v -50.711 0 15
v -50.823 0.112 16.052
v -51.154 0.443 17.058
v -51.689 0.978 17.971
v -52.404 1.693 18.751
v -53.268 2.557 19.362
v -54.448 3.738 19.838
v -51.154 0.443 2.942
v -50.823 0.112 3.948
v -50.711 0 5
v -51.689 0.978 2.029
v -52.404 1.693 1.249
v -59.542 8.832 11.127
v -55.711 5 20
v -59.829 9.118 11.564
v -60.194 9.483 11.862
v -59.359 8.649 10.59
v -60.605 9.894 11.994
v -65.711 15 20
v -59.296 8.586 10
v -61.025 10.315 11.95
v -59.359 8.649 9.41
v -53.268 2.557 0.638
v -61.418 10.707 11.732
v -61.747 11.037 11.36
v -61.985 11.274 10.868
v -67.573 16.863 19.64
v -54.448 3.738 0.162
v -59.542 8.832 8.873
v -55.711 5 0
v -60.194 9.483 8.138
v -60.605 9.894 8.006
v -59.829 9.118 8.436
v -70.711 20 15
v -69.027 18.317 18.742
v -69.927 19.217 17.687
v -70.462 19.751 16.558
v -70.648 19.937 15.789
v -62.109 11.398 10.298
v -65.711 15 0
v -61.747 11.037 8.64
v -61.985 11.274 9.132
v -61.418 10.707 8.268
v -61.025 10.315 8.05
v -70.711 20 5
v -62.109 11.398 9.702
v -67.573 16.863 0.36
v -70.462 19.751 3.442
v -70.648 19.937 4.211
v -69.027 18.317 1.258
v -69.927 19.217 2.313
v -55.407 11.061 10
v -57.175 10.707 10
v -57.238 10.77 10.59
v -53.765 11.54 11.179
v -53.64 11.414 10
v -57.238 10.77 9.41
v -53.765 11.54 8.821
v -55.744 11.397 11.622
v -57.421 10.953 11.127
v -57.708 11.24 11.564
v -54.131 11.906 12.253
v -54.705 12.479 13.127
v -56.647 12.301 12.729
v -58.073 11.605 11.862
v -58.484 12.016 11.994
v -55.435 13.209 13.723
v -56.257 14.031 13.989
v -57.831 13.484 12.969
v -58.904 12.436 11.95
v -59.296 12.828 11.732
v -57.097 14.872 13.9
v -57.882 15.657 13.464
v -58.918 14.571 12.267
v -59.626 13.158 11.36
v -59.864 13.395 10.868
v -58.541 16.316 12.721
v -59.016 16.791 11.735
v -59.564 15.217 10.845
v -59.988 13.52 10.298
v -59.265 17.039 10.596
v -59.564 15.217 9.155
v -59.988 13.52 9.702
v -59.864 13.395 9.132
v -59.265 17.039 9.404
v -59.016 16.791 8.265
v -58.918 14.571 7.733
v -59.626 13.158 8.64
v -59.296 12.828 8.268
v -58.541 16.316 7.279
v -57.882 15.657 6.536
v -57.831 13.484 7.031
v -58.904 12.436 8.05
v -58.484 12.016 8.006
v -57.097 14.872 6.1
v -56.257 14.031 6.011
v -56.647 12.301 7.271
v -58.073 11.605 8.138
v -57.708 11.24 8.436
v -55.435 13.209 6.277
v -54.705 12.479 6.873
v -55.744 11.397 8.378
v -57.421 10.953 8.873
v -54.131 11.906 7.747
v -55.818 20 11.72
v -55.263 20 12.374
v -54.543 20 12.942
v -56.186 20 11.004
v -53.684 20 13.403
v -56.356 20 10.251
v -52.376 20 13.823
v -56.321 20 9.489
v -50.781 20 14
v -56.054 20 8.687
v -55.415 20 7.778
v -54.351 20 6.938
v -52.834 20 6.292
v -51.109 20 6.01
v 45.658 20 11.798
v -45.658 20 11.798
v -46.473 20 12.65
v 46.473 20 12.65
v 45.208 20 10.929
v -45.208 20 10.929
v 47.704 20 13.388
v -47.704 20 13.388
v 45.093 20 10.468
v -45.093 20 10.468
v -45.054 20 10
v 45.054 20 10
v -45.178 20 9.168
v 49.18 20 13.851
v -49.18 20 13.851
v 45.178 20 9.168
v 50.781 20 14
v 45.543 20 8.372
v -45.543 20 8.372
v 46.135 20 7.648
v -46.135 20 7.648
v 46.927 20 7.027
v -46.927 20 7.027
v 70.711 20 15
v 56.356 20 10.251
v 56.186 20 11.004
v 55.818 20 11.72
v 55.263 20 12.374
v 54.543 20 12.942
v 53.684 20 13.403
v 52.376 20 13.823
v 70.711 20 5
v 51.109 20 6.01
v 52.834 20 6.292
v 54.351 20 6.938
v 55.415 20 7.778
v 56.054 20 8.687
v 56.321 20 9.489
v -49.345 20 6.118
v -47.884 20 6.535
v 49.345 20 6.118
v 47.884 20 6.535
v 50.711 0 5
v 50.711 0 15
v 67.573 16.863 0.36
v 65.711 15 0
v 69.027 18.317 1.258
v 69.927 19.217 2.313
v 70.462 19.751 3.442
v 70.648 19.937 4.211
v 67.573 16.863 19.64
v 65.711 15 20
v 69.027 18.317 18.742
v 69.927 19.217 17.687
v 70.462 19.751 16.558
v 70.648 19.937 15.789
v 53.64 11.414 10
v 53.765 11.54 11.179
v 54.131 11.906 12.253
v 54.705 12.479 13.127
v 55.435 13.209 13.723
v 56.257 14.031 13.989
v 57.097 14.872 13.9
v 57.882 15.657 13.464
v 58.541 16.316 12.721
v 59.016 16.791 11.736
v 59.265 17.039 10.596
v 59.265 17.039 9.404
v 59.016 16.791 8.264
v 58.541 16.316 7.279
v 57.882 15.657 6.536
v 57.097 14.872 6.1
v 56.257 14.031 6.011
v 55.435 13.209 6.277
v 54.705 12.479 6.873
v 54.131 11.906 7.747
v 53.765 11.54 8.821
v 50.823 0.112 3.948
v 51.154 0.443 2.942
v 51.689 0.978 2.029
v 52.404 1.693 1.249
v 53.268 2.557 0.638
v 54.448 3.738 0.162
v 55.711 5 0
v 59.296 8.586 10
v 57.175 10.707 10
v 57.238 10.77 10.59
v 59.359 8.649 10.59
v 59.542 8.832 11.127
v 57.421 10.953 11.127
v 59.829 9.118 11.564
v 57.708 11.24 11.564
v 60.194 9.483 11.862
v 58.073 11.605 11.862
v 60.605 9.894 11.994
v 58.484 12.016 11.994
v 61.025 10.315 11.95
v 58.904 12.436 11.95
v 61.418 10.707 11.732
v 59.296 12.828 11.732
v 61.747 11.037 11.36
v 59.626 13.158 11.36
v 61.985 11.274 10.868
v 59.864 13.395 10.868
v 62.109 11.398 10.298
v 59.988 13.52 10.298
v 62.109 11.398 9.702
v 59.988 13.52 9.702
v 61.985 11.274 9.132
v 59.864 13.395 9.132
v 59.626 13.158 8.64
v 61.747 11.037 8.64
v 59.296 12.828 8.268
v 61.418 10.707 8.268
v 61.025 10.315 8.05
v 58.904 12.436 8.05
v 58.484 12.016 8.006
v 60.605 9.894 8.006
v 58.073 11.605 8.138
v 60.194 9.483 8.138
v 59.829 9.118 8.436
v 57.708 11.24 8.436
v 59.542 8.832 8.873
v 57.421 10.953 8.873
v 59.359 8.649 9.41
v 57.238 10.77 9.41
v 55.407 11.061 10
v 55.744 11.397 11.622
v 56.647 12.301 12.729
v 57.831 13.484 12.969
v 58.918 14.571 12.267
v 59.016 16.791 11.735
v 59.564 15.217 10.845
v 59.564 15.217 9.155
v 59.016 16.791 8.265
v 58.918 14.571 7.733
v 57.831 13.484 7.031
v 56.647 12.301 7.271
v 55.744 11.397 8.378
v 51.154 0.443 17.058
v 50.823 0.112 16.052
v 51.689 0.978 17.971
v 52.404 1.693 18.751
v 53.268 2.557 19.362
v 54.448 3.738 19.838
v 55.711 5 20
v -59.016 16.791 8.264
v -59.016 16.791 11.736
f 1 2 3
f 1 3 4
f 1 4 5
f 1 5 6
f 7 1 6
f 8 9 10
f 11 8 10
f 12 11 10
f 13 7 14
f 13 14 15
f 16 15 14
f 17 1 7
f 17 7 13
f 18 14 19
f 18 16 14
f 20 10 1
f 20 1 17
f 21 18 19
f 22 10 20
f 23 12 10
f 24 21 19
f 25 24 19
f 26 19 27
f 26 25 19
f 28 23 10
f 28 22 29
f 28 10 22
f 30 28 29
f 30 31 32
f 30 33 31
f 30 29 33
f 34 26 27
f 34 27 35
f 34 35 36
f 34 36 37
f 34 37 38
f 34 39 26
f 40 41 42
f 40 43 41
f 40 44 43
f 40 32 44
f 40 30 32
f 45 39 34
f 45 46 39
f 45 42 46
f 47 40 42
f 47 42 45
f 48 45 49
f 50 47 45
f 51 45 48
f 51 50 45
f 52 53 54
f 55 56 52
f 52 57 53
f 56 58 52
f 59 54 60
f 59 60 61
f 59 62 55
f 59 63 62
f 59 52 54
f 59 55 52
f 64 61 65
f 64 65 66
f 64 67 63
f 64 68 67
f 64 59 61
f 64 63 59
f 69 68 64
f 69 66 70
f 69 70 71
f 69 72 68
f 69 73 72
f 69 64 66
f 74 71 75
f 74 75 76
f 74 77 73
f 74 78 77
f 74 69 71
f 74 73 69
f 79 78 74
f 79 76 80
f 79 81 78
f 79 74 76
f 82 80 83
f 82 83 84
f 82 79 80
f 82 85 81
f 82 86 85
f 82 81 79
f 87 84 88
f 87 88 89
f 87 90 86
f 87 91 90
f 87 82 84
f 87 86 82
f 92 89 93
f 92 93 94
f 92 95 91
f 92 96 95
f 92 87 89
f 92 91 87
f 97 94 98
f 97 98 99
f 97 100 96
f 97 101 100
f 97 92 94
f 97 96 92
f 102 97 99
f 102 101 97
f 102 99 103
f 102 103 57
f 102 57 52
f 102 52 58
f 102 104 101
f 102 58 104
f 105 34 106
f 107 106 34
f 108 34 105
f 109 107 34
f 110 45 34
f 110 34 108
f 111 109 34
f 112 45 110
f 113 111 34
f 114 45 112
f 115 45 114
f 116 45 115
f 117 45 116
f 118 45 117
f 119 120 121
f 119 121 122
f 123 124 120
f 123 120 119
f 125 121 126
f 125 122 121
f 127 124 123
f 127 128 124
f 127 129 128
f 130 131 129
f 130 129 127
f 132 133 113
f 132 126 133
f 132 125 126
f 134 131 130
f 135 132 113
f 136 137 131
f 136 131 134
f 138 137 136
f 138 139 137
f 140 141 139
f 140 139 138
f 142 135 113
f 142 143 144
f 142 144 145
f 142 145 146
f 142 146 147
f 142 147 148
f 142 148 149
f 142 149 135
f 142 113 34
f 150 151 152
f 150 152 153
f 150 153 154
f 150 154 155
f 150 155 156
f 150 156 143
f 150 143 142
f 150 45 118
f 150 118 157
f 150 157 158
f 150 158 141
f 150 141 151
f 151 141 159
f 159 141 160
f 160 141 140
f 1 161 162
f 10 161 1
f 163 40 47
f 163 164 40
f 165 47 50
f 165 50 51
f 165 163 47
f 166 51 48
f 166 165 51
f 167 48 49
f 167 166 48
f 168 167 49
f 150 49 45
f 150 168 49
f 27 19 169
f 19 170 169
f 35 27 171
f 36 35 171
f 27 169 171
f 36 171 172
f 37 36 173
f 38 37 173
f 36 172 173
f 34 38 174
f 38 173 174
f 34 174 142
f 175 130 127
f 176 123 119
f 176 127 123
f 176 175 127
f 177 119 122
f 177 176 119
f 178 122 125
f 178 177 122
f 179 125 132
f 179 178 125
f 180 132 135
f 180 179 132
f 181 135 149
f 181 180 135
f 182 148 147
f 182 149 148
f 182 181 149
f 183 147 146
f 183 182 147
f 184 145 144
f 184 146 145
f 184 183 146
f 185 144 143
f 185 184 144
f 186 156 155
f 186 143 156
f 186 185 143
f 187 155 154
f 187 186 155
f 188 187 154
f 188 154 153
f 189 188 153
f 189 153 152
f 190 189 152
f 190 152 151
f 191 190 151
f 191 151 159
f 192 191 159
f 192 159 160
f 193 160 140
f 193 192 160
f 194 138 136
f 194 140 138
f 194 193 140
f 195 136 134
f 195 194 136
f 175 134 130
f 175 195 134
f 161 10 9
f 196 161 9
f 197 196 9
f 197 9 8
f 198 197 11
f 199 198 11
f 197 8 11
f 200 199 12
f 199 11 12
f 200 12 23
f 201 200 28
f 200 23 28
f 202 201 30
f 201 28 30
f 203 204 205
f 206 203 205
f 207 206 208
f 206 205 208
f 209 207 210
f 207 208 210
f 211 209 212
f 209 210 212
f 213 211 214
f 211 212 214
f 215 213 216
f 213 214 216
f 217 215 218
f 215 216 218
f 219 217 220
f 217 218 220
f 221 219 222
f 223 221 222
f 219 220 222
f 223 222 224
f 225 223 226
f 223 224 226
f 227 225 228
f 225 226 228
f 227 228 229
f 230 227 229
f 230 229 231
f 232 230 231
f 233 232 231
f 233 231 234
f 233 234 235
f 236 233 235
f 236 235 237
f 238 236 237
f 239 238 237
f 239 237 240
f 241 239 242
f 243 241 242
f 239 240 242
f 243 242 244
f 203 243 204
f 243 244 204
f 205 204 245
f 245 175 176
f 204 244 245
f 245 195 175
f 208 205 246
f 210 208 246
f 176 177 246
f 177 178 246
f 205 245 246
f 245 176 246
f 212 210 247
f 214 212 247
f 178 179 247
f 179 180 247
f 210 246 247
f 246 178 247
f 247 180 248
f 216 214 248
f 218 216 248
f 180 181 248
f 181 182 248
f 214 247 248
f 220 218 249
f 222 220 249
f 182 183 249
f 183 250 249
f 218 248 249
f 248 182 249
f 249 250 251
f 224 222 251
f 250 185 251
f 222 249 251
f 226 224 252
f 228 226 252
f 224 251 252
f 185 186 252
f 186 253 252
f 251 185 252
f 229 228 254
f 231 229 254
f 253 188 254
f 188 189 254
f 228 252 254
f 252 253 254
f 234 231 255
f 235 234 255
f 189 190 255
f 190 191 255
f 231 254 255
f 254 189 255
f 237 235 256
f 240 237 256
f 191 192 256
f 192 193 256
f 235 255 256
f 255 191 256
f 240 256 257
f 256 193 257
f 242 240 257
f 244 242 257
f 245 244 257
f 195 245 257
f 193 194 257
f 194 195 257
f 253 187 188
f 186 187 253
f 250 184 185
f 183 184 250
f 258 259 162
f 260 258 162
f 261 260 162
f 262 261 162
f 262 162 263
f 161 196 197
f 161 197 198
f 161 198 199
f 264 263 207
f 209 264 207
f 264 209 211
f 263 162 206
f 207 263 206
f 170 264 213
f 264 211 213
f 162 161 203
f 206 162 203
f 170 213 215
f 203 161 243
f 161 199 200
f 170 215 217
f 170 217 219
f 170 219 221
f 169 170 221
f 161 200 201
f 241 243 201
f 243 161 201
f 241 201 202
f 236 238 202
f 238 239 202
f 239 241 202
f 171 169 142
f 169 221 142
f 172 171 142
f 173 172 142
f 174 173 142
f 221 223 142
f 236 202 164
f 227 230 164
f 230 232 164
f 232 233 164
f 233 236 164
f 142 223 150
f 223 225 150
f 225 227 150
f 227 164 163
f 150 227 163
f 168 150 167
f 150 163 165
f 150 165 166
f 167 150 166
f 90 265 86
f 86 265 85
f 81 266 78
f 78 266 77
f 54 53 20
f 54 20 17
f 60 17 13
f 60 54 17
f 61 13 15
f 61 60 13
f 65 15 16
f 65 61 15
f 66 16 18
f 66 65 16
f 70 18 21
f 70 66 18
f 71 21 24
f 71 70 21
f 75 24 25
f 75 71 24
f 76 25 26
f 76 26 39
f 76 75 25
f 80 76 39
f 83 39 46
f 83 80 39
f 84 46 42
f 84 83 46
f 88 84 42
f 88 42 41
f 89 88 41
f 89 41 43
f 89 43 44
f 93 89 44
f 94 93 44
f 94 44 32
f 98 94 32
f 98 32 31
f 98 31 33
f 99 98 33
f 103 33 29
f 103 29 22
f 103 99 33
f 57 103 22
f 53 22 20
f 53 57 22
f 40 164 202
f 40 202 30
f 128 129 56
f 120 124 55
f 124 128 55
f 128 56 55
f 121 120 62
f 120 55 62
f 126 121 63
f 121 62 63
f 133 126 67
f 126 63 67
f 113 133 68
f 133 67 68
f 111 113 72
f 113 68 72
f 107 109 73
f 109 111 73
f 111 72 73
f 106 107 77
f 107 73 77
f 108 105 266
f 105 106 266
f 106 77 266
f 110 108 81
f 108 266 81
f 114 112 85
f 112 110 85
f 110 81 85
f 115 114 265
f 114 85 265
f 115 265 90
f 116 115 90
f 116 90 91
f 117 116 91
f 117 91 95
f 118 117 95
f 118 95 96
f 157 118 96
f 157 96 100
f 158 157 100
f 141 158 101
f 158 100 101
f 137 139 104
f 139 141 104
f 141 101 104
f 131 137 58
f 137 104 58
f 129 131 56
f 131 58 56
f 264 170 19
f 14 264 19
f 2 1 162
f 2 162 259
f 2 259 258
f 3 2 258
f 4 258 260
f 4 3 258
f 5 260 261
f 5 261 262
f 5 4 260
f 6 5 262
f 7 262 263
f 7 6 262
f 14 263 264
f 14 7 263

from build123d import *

# Parameters (mm, degrees)
PAD_DEPTH         = 20
SKETCH002_R       = 2
POCKET_DEPTH      = 20.143136
POCKET_DEPTH_BACK = 44.001
SKETCH003_R       = 4
POCKET001_DEPTH   = 44.001
CHAMFER_SIZE2     = 1.9999
CHAMFER_SIZE      = 3
FILLET_R          = 5


with BuildPart() as part:
    # Sketch → Pad (new body)
    with BuildSketch(Plane.XY):
        Polygon((0, 0), (50.710678, 0), (70.710678, 20), (0, 20), align=None)
    extrude(amount=PAD_DEPTH)

    # Sketch002 (on DatumPlane) → Pocket (cut, two sides)
    with BuildSketch(Plane(origin=(21.112698, -21.112698, 0), x_dir=(-0.707107, -0.707107, 0), z_dir=(-0.707107, 0.707107, 0))) as pocket_sk:
        with Locations((-50, 10)):
            Circle(SKETCH002_R)
    extrude(amount=-POCKET_DEPTH, mode=Mode.SUBTRACT)
    extrude(pocket_sk.sketch, amount=POCKET_DEPTH_BACK, mode=Mode.SUBTRACT)

    # Sketch003 (on DatumPlane) → Pocket001 (cut, through all)
    with BuildSketch(Plane(origin=(21.112698, -21.112698, 0), x_dir=(-0.707107, -0.707107, 0), z_dir=(-0.707107, 0.707107, 0))):
        with Locations((-50, 10)):
            Circle(SKETCH003_R)
    extrude(amount=POCKET001_DEPTH, mode=Mode.SUBTRACT)

    # Chamfer
    chamfer_edges = [part.edges().sort_by_distance(p)[0] for p in [
        (57.882251, 15.656854, 10),
    ]]
    chamfer_side = part.faces().sort_by_distance((60.003571, 13.535534, 10))[0]
    chamfer(chamfer_edges, length=CHAMFER_SIZE, length2=CHAMFER_SIZE2, reference=chamfer_side)

    # Fillet
    fillet_edges = [part.edges().sort_by_distance(p)[0] for p in [
        (35.355339, 20, 20),
        (25.355339, 0, 20),
        (35.355339, 20, 0),
        (25.355339, 0, 0),
    ]]
    fillet(fillet_edges, radius=FILLET_R)

    # Mirrored: part across YZ


with BuildPart() as part_1:
    add(part.part)
    add(part.part.mirror(Plane.YZ))


solid = part_1.part
